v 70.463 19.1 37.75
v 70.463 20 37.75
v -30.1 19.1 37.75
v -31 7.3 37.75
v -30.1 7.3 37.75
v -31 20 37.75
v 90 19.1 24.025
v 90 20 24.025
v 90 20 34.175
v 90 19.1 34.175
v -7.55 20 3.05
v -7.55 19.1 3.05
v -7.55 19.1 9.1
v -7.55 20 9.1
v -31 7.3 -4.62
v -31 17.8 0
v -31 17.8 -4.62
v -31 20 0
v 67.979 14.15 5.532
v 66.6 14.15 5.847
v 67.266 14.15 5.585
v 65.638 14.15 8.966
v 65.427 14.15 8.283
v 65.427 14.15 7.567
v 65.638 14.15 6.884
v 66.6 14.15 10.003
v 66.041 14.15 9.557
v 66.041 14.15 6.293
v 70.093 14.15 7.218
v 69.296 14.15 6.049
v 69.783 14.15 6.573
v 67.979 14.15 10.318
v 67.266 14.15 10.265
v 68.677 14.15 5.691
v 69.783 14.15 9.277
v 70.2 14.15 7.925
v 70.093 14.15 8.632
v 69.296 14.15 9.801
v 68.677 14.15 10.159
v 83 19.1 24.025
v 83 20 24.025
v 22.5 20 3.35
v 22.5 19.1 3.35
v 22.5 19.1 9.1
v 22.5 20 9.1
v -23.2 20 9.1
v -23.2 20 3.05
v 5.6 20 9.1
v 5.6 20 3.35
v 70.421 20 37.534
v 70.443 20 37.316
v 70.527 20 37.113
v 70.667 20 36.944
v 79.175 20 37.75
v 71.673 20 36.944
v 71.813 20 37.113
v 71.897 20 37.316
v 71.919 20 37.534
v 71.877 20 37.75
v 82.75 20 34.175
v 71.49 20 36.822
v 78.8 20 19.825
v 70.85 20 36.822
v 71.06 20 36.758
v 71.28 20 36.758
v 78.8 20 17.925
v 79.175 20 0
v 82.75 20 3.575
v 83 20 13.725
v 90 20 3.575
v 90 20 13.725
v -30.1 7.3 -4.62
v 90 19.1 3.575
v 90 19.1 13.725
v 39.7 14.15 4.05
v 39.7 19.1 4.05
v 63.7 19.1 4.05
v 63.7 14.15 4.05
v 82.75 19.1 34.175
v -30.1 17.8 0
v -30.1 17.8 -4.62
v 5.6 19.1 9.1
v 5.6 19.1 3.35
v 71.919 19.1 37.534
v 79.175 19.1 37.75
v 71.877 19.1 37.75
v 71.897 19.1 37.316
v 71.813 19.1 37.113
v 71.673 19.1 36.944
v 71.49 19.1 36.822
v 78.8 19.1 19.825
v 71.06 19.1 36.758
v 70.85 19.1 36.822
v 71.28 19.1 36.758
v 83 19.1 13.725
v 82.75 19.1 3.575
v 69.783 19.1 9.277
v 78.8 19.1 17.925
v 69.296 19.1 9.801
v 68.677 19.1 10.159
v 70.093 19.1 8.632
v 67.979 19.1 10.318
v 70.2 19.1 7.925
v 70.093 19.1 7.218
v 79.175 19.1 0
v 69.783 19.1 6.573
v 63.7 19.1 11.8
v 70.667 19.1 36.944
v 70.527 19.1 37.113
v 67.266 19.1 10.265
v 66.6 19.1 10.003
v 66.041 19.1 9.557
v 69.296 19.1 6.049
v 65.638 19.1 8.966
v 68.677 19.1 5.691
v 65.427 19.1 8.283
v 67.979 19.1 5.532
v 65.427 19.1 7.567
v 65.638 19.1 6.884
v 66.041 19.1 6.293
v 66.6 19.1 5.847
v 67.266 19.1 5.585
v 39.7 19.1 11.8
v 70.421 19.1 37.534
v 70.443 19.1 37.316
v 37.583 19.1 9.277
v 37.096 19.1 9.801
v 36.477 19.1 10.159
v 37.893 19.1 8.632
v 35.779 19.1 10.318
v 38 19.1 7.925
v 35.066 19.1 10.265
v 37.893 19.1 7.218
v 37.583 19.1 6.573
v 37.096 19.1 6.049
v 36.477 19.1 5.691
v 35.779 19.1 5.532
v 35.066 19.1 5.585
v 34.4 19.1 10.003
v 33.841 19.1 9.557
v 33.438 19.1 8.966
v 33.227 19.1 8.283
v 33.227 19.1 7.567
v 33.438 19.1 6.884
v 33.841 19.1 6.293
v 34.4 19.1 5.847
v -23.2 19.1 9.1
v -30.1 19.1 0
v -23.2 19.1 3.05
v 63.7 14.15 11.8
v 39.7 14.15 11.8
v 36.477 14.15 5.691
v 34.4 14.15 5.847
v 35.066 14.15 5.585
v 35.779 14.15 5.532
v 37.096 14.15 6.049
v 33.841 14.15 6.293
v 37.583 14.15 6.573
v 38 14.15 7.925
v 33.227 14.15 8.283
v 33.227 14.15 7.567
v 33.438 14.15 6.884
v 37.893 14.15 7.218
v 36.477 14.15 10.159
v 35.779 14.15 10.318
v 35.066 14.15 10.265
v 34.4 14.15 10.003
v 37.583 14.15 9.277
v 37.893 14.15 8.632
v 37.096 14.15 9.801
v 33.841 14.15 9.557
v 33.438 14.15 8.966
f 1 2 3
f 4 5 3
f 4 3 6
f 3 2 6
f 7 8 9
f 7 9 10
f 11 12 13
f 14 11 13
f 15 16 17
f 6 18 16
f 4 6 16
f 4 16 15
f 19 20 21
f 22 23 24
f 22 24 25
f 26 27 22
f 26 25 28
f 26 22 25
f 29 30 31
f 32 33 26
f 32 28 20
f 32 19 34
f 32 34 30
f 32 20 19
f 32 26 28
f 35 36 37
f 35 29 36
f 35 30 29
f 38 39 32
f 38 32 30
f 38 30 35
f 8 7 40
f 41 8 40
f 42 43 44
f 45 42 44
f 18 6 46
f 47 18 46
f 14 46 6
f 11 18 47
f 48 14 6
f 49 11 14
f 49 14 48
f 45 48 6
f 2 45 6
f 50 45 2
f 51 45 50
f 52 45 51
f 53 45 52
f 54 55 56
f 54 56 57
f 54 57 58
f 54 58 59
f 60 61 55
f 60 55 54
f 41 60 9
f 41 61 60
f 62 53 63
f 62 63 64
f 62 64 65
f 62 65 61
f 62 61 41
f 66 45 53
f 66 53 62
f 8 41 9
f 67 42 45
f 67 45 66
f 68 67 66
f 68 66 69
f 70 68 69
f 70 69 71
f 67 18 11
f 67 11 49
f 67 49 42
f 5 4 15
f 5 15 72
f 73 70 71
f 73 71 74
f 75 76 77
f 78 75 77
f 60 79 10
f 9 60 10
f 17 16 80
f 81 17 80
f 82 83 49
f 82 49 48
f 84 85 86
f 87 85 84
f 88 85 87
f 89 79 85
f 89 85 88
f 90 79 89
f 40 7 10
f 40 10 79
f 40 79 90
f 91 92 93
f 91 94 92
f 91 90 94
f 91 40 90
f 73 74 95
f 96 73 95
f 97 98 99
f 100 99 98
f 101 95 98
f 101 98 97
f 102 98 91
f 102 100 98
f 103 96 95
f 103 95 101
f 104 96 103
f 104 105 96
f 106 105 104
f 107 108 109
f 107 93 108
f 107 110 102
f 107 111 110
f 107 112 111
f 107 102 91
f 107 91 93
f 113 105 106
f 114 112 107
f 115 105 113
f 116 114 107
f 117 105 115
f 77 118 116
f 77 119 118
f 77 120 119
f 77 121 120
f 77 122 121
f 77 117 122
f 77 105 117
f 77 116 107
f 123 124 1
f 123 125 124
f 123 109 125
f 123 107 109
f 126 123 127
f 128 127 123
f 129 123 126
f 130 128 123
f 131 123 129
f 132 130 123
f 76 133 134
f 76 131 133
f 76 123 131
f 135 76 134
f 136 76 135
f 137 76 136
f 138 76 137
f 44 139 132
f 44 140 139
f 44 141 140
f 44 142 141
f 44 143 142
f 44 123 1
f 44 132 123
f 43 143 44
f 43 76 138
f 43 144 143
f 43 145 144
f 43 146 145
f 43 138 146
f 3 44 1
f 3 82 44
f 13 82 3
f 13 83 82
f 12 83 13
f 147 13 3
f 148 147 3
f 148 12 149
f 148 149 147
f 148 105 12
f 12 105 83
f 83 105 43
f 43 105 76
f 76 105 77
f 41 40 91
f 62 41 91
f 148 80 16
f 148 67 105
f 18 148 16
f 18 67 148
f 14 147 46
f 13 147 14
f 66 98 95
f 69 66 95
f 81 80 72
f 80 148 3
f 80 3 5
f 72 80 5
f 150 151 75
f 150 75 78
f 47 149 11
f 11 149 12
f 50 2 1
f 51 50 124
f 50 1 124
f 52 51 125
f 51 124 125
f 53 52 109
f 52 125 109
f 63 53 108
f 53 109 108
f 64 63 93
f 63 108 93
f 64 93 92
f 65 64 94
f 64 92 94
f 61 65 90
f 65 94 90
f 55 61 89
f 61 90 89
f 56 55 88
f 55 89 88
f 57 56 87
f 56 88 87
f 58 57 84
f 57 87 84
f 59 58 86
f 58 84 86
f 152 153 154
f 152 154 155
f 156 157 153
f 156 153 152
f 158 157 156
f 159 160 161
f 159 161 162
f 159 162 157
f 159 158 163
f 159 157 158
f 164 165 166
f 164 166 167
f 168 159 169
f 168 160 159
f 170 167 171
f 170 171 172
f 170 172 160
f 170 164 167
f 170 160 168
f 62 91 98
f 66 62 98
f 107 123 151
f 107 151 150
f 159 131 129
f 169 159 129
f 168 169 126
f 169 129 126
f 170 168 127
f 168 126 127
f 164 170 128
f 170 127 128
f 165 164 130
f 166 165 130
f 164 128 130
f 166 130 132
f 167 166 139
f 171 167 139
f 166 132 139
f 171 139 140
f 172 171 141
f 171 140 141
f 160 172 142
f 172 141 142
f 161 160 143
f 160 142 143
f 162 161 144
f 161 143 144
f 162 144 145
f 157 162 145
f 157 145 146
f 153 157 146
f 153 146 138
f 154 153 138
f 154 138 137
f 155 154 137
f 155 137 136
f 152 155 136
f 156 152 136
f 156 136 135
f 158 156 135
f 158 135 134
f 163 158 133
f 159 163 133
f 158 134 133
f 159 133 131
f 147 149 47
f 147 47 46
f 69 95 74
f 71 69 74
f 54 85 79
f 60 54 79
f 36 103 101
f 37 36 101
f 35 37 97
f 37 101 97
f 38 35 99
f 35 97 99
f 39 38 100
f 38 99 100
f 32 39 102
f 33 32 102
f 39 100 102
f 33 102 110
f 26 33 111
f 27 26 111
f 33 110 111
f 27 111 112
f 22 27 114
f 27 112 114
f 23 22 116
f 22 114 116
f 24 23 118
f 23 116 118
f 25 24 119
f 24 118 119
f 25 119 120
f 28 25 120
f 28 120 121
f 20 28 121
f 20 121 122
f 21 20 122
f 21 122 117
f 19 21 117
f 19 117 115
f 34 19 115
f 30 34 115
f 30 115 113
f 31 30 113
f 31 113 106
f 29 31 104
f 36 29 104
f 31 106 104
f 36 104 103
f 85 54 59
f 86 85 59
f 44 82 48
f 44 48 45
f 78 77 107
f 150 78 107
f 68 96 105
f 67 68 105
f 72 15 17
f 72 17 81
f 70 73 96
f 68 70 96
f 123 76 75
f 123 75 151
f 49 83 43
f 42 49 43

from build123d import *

# Parameters (mm, degrees)
PAD_DEPTH       = 37.75
SKETCH001_R     = 0.75
SKETCH001_W     = 16.9
SKETCH001_H     = 5.75
SKETCH001_W_2   = 15.65
SKETCH001_H_2   = 6.05
POCKET_DEPTH    = 5
SKETCH003_R     = 2.4
SKETCH003_W     = 24
SKETCH003_H     = 7.75
PAD001_DEPTH    = 4.95
POCKET001_DEPTH = 4.9
SKETCH004_W     = 0.9
SKETCH004_H     = 10.5
PAD002_DEPTH    = 4.62


with BuildPart() as part:
    # Sketch → Pad (new body)
    with BuildSketch(Plane.XY):
        Polygon((-31, 20), (90, 20), (90, 19.1), (-30.1, 19.1), (-30.1, 7.3), (-31, 7.3), align=None)
    extrude(amount=PAD_DEPTH)

    # Sketch001 (on Face3 of Pad) → Pocket (cut)
    with BuildSketch(Plane.XZ.offset(-19.1)):
        with Locations((71.17, 37.5)):
            Circle(SKETCH001_R)
        Polygon((90, 34.175), (90, 24.025), (83, 24.025), (78.8, 19.825), (78.8, 17.925), (83, 13.725), (90, 13.725), (90, 3.575), (82.75, 3.575), (79.175, 0), (79.175, -11.454838), (99.765602, -11.454838), (99.765602, 41.466698), (78.897491, 41.466698), (79.175, 37.75), (82.75, 34.175), align=None)
        with Locations((14.05, 6.225)):
            Rectangle(SKETCH001_W, SKETCH001_H)
        with Locations((-15.375, 6.075)):
            Rectangle(SKETCH001_W_2, SKETCH001_H_2)
    extrude(amount=-POCKET_DEPTH, mode=Mode.SUBTRACT)

    # Sketch003 → Pad001 (join)
    with BuildSketch(Plane.XZ.offset(-19.1)):
        with Locations((67.8, 7.925)):
            Circle(SKETCH003_R)
        with Locations((35.6, 7.925)):
            Circle(SKETCH003_R)
        with Locations((51.7, 7.925)):
            Rectangle(SKETCH003_W, SKETCH003_H)
    extrude(amount=PAD001_DEPTH)

    # Sketch001 (on Face3 of Pad) → Pocket001 (cut)
    with BuildSketch(Plane.XZ.offset(-19.1)):
        with Locations((71.17, 37.5)):
            Circle(SKETCH001_R)
        Polygon((90, 34.175), (90, 24.025), (83, 24.025), (78.8, 19.825), (78.8, 17.925), (83, 13.725), (90, 13.725), (90, 3.575), (82.75, 3.575), (79.175, 0), (79.175, -11.454838), (99.765602, -11.454838), (99.765602, 41.466698), (78.897491, 41.466698), (79.175, 37.75), (82.75, 34.175), align=None)
        with Locations((14.05, 6.225)):
            Rectangle(SKETCH001_W, SKETCH001_H)
        with Locations((-15.375, 6.075)):
            Rectangle(SKETCH001_W_2, SKETCH001_H_2)
    extrude(amount=-POCKET001_DEPTH, mode=Mode.SUBTRACT)

    # Sketch004 (on Face2 of Pocket001) → Pad002 (join)
    with BuildSketch(Plane(origin=(0, 0, 0), x_dir=(1, 0, 0), z_dir=(0, 0, -1))):
        with Locations((-30.55, -12.55)):
            Rectangle(SKETCH004_W, SKETCH004_H)
    extrude(amount=PAD002_DEPTH)


solid = part.part
